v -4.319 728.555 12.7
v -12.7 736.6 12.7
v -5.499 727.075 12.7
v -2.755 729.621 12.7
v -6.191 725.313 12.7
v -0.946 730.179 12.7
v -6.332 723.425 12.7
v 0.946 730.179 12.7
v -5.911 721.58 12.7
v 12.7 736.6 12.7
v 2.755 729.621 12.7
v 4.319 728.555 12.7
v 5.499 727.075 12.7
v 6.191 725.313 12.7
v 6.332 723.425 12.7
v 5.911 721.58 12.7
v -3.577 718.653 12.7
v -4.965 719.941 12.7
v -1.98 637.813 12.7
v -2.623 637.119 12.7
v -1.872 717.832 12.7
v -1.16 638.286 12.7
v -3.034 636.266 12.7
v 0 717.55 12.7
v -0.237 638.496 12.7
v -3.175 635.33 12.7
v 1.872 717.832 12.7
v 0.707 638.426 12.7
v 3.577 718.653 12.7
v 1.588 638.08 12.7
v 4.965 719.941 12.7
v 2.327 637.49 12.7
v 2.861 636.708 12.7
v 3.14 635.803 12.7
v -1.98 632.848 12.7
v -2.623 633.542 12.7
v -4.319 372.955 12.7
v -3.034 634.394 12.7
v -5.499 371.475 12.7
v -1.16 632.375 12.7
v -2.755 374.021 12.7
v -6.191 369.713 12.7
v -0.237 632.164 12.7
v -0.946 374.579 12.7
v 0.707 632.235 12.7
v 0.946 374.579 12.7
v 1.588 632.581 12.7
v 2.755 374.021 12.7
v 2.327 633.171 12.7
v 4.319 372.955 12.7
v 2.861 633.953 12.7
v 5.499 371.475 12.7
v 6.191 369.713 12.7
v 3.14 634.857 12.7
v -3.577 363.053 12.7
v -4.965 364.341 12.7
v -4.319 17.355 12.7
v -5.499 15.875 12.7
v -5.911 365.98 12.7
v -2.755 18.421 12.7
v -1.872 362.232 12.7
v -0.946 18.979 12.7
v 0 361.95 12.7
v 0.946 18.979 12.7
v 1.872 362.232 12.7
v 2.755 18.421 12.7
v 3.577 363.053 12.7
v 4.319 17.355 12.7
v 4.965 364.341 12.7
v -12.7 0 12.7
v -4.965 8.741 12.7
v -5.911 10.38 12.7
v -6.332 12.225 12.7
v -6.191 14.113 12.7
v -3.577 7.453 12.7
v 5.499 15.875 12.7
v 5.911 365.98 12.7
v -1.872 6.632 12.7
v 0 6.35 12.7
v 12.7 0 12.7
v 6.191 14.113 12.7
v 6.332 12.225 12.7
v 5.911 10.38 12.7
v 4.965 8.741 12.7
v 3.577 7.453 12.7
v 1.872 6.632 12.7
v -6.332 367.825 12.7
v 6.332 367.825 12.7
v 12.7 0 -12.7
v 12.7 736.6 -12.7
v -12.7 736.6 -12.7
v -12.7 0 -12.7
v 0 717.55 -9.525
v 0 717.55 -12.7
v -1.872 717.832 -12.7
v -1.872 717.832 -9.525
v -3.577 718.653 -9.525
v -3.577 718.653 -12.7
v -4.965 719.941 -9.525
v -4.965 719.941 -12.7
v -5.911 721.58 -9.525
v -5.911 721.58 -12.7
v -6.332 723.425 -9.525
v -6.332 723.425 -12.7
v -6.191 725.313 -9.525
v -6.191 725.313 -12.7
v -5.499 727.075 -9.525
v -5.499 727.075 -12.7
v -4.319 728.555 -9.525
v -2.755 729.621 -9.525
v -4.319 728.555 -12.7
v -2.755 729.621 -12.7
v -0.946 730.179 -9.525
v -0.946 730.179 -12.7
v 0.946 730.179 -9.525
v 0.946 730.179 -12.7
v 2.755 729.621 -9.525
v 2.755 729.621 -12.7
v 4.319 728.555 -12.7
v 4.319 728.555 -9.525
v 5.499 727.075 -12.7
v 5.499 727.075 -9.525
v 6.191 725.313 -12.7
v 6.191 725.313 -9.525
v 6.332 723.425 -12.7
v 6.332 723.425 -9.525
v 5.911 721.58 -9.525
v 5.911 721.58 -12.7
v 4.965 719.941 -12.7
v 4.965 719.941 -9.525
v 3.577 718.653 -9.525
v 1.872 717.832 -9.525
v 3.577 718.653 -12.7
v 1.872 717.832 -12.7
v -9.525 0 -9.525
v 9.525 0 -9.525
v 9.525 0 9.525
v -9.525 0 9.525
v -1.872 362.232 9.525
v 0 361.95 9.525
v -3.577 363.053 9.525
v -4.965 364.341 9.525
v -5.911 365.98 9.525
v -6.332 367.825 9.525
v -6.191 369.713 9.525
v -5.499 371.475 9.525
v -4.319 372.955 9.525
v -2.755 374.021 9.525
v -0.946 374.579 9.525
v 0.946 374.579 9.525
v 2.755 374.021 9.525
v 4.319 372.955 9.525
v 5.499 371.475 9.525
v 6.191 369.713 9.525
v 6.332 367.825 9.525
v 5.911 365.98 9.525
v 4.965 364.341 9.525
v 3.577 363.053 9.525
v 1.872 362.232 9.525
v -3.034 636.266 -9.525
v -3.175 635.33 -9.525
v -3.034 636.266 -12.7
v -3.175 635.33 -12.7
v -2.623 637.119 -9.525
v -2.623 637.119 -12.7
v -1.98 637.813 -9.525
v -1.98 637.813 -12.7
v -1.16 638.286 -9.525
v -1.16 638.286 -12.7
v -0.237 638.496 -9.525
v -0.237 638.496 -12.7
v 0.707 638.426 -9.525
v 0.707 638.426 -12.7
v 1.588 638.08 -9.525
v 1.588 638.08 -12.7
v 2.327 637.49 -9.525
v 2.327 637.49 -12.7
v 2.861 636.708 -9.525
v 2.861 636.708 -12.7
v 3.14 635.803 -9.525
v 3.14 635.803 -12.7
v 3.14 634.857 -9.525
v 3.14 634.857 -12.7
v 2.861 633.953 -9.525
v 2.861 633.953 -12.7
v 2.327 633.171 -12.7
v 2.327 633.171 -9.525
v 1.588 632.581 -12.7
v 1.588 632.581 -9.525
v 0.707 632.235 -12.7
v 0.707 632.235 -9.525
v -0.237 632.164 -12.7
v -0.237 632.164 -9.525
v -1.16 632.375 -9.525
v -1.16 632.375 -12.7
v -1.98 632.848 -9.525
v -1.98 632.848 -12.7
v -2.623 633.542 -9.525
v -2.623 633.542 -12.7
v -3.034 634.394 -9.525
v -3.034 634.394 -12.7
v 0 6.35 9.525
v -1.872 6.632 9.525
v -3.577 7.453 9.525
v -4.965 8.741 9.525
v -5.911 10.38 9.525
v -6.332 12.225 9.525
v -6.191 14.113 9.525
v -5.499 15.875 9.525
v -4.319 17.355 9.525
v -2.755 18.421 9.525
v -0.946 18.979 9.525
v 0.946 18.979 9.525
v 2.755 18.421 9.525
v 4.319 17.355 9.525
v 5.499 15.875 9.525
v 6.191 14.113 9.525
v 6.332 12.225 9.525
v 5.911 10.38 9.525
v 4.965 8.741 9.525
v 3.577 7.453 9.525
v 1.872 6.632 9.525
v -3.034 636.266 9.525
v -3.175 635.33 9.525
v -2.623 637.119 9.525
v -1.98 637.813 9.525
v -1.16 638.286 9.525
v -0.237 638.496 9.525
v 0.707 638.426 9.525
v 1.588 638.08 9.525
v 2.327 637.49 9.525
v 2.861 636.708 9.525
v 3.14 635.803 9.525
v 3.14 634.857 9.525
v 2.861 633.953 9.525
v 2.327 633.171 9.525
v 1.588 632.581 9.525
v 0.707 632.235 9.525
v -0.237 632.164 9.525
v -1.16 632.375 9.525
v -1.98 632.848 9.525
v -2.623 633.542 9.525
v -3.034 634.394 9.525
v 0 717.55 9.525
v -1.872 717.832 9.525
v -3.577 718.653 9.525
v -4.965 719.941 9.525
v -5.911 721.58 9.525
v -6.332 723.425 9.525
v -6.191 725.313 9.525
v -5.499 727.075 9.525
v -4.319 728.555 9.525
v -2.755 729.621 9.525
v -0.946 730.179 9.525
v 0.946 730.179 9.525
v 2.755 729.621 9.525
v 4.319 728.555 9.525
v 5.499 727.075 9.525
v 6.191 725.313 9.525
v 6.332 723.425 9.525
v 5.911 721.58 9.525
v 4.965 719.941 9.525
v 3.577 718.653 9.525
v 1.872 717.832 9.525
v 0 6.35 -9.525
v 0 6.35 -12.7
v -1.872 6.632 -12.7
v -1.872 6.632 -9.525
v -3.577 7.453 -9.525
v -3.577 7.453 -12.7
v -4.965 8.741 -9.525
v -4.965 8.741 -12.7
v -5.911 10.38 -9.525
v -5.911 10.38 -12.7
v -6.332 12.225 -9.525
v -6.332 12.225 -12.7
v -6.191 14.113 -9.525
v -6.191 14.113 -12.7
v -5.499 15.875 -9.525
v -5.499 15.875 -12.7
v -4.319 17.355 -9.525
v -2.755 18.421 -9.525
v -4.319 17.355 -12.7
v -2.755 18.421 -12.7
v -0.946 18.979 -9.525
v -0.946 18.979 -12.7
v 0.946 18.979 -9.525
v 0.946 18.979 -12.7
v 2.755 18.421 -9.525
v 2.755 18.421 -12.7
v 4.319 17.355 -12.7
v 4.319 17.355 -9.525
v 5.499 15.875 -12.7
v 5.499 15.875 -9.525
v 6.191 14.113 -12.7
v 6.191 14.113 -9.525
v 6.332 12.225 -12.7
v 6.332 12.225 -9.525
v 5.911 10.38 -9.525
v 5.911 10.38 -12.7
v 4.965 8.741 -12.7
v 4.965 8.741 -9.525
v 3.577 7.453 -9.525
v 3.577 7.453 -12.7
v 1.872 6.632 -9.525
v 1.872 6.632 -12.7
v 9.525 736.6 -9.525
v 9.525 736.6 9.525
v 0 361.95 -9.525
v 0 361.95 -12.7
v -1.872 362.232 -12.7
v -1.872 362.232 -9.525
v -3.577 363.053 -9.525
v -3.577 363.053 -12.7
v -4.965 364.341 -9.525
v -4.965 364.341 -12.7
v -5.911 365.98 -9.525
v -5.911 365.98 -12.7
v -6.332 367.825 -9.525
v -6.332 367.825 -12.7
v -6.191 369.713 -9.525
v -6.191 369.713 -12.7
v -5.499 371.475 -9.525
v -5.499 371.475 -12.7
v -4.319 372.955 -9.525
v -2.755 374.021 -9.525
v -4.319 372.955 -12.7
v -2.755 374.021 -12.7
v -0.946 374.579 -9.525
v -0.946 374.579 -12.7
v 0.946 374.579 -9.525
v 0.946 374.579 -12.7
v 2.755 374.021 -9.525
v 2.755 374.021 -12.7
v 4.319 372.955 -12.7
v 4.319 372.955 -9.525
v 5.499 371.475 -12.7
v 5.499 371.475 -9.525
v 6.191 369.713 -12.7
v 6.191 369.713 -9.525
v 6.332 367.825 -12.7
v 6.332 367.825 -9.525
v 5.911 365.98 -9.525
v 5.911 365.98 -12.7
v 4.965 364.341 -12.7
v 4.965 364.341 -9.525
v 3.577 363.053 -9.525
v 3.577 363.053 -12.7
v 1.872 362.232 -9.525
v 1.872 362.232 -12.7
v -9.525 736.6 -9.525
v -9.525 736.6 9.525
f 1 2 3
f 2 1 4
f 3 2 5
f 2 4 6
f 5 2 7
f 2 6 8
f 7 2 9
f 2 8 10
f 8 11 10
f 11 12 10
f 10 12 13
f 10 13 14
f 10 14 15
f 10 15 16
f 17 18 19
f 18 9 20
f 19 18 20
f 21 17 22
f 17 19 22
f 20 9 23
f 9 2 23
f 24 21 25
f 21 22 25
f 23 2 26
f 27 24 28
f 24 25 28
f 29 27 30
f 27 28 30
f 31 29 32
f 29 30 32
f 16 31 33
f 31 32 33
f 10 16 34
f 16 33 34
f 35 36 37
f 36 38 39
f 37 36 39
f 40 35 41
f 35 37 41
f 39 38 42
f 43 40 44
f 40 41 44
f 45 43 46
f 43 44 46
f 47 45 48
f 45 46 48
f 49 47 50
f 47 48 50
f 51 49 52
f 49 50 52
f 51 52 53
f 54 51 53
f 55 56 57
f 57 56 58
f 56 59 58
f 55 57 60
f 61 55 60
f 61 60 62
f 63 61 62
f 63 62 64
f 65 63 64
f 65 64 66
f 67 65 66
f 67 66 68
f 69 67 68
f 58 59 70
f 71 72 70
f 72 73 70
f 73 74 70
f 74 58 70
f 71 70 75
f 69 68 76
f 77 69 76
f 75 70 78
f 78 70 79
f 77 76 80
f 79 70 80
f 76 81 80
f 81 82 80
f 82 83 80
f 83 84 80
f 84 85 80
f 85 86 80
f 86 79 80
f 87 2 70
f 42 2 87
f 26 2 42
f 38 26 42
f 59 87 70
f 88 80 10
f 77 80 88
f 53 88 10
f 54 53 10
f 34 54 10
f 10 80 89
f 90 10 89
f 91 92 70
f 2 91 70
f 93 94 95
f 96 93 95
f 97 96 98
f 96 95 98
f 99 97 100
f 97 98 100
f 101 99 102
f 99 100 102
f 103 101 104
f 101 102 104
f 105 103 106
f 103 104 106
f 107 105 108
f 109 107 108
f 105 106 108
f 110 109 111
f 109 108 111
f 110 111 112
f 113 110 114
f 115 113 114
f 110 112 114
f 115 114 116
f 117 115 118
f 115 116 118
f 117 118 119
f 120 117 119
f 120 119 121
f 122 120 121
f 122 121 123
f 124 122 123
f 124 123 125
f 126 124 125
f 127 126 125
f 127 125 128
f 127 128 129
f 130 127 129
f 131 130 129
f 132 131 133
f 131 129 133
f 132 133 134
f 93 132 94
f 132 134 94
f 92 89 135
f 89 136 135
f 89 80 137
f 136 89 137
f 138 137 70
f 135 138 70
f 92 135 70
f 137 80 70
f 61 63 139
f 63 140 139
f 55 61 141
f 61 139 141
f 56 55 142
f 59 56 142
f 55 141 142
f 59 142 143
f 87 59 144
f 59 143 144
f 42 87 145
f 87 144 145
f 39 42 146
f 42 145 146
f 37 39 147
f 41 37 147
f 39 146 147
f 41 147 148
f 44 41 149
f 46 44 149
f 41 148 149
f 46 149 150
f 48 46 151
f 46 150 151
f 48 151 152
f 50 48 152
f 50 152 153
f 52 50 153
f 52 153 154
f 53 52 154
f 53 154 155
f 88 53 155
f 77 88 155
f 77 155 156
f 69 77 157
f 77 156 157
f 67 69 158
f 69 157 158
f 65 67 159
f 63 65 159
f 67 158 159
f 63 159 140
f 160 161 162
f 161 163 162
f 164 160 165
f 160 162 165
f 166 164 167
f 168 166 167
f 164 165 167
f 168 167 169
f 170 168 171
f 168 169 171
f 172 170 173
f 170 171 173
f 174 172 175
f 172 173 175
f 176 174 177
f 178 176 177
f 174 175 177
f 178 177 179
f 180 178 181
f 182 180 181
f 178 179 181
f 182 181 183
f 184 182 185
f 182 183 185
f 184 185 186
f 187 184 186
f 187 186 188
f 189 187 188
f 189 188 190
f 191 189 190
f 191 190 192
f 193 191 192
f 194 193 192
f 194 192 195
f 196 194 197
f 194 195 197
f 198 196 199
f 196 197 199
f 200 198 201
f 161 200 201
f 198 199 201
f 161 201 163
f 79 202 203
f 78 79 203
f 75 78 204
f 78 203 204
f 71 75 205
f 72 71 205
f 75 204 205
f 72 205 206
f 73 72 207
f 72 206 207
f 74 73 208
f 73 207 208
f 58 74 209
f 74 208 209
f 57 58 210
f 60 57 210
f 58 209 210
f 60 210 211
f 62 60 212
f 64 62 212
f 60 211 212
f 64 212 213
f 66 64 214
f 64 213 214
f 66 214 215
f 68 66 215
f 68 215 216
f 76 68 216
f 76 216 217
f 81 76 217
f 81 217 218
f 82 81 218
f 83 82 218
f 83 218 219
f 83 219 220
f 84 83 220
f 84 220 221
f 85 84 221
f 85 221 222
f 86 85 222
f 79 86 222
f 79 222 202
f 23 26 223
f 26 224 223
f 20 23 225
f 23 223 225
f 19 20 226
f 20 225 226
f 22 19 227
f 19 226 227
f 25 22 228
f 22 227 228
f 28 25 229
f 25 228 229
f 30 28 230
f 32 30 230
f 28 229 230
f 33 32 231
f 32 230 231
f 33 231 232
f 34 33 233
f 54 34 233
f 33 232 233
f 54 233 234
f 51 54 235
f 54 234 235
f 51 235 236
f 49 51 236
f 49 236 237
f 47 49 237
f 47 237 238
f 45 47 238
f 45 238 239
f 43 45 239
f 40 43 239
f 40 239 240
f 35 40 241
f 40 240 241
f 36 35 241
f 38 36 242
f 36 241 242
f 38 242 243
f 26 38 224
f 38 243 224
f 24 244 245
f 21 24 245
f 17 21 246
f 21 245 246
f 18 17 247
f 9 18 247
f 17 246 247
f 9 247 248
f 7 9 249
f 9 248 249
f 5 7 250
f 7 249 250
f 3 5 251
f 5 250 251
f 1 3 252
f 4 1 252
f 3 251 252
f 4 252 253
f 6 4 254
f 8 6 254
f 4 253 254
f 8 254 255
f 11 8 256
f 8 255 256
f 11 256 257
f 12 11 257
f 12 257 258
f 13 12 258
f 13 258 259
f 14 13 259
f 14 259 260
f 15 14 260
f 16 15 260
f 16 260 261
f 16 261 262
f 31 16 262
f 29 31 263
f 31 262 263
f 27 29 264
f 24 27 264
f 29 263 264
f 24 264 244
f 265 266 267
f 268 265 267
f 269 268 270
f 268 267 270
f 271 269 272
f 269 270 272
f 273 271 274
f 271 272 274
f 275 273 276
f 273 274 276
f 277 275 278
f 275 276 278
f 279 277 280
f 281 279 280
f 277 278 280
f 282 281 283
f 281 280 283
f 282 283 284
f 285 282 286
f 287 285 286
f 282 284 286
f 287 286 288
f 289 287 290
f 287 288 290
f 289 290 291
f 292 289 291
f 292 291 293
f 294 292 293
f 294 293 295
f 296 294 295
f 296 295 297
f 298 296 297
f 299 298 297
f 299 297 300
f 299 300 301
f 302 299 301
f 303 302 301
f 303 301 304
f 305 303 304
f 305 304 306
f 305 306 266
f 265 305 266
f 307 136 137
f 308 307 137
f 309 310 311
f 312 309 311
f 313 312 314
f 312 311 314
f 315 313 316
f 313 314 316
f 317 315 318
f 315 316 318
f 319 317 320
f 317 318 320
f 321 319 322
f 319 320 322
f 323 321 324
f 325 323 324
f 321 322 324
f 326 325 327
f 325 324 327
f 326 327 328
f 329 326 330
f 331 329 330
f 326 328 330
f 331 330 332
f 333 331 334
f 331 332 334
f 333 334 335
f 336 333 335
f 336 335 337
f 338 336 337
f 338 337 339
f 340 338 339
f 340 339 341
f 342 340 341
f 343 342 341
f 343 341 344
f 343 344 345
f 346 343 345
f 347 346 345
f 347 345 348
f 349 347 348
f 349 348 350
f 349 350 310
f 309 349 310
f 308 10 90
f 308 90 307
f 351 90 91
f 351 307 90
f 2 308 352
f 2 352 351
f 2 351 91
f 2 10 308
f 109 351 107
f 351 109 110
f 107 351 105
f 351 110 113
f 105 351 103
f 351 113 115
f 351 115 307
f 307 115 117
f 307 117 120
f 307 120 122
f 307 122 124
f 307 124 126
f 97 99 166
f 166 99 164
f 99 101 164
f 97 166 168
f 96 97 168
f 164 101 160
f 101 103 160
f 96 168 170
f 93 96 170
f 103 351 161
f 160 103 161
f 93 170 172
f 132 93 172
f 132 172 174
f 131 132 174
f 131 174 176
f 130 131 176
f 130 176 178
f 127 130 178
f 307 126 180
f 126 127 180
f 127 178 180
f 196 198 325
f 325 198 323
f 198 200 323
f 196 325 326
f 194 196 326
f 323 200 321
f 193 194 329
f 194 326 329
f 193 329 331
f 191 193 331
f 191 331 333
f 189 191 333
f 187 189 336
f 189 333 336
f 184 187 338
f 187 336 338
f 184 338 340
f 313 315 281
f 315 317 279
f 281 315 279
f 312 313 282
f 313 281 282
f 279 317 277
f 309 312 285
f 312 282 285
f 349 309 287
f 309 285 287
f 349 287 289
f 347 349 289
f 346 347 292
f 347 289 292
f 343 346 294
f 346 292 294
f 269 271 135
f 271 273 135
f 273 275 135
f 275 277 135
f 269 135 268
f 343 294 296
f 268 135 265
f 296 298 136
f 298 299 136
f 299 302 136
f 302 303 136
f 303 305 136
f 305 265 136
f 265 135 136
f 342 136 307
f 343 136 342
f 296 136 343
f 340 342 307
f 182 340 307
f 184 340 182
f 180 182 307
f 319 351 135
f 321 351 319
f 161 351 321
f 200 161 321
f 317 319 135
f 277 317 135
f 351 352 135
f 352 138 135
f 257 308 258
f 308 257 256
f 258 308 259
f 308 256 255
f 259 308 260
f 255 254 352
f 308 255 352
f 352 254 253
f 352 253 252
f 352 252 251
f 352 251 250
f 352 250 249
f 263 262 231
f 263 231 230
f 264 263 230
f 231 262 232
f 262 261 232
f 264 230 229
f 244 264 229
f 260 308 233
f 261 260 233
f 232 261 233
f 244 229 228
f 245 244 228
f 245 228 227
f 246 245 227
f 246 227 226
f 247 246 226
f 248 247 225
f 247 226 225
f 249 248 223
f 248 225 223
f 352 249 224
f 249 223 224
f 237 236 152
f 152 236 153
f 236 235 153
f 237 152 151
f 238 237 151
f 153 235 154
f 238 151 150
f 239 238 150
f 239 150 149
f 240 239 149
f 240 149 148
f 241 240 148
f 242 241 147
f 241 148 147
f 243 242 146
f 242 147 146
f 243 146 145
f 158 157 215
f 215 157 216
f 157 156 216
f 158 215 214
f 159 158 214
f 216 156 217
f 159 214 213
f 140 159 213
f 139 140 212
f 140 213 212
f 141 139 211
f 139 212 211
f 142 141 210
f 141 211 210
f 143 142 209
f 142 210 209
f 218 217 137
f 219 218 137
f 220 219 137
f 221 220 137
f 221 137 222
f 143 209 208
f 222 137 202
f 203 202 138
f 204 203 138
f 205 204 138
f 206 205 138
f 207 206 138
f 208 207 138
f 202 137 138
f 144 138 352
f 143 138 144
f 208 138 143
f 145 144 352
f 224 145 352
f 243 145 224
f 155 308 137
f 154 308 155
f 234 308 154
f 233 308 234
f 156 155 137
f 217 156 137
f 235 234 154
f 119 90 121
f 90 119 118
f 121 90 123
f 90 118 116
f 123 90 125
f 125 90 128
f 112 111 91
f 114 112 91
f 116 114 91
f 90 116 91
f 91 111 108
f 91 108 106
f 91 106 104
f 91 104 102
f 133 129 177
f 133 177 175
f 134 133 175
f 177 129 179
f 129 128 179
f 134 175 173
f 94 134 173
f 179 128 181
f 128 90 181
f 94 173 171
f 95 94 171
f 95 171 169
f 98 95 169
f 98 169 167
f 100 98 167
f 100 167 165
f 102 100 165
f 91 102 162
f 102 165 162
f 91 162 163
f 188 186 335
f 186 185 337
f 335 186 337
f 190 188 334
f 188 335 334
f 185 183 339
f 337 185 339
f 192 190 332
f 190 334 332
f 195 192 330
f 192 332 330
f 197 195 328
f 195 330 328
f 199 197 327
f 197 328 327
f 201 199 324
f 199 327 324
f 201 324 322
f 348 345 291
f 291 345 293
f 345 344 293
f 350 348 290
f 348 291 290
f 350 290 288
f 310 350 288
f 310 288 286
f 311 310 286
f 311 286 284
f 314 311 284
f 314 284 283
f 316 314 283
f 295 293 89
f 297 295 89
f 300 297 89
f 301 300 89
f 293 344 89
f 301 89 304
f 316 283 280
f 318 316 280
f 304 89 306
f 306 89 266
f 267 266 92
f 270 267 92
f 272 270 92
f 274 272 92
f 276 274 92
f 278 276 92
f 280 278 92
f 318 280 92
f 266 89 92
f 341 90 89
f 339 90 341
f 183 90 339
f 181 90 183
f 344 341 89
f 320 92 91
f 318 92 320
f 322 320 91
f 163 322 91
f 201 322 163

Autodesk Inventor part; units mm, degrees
ref_plane "YZ Plane" through (0, 0, 0) normal (1, 0, 0) x (0, 1, 0)
ref_plane "XZ Plane" through (0, 0, 0) normal (0, 1, 0) x (-1, 0, 0)
ref_plane "XY Plane" through (0, 0, 0) normal (0, 0, 1) x (1, 0, 0)
sketch "Sketch1" plane through (0, 0, 0) normal (0, 1, 0) x (-1, 0, 0)
  line L0 (12.7, 12.7) -> (-12.7, 12.7)
  line L1 (-12.7, 12.7) -> (-12.7, -12.7)
  line L2 (-12.7, -12.7) -> (12.7, -12.7)
  line L3 (12.7, -12.7) -> (12.7, 12.7)
  line L4 (-9.525, 9.525) -> (9.525, 9.525)
  line L5 (9.525, 9.525) -> (9.525, -9.525)
  line L6 (9.525, -9.525) -> (-9.525, -9.525)
  line L7 (-9.525, -9.525) -> (-9.525, 9.525)
  point P0 (0, 0)
  point P1 (12.7, 0)
  point P2 (0, -12.7)
  dimension "d0" = 25.4
  dimension "d1" = 25.4
  dimension "d2" = 3.175
extrude "Extrusion1" add sketch "Sketch1" along normal blind 736.6
sketch "Sketch2" plane through (-12.7, 0, 12.7) normal (0, 0, 1) x (1, 0, 0)
  line L0 (0, 736.6) -> (25.4, 736.6) projected
  line L1 (0, 0) -> (25.4, 0) projected
  point P0 (12.7, 0)
  point P1 (12.7, 12.7)
  point P2 (12.7, 723.9)
  point P3 (12.7, 368.3)
  dimension "d5" = 12.7
  dimension "d6" = 12.7
  dimension "d7" = 368.3
hole "Hole1" at (0, 12.7, 12.7) at (0, 723.9, 12.7) at (0, 368.3, 12.7) direction (0, 0, -1) diameter 12.7 end through all
sketch "Sketch3" plane through (-12.7, 0, 12.7) normal (0, 0, 1) x (1, 0, 0)
  line L0 (21.6869, 114.0639) -> (21.6869, 96.9638) construction
  line L1 (21.6869, 96.9638) -> (5.8083, 96.9638) construction
  line L2 (5.8083, 96.9638) -> (5.8083, 114.0639) construction
  line L3 (5.8083, 114.0639) -> (21.6869, 114.0639) construction
  point P0 (12.7, 0)
sketch "Sketch4" plane through (12.7, 0, -12.7) normal (0, 0, -1) x (-1, 0, 0)
  circle A0 centre (12.7, 635.3302) radius 3.175
  line L0 (0, 736.6) -> (25.4, 736.6) projected
  point P0 (12.7, 0)
  dimension "d15" = 101.2698
  dimension "d16" = 6.35
extrude "Extrusion2" cut sketch "Sketch4" against normal through all
equation "\"d0\" = Tube_size"
equation "\"d1\" = Tube_size"
equation "\"d2\" = Wall_Thickness"
equation "\"d3\" = Bar3_1_Length"
equation "\"d5\" = Uper_Pivit_Offset_FromEdge"
equation "\"d6\" = Lower_Pivit_Offset_FromEdge"
equation "\"d7\" = Bar3_1_Center_Pivit_Offset_FromEdge"
equation "\"d8\" = Pin_Size"
equation "\"Bar1_1_Length\" = 736.6"
equation "\"Tube_size_1\" = 25.4"
equation "\"Wall_Thickness_1\" = 3.175"
equation "\"Lower_Pivit_Offset_FromEdge\" = 12.7"
equation "\"Uper_Pivit_Offset_FromEdge\" = 12.7"
equation "\"Bar1_1_Center_Pivit_Offset_FromEdge\" = 368.3"
equation "\"Bar1_2_Length\" = 736.6"
equation "\"Bar2_1_Length\" = 736.6"
equation "\"Bar2_2_Length\" = 736.6"
equation "\"Bar3_1_Length\" = 736.6"
equation "\"Bar3_2_Length\" = 736.6"
equation "\"Tube_size\" = 25.4"
equation "\"Wall_Thickness\" = 3.175"
equation "\"Bar1_2_Center_Pivit_Offset_FromEdge\" = 368.3"
equation "\"Bar2_1_Center_Pivit_Offset_FromEdge\" = 368.3"
equation "\"Bar2_2_Center_Pivit_Offset_FromEdge\" = 368.3"
equation "\"Bar3_1_Center_Pivit_Offset_FromEdge\" = 368.3"
equation "\"Bar4_2_Center_Pivit_Offset_FromEdge\" = 355.6"
equation "\"Pin_Size\" = 12.7"
equation "\"Bar3_2_Center_Pivit_Offset_FromEdge\" = 368.3"
properties part number "2018 Bar3_1"
